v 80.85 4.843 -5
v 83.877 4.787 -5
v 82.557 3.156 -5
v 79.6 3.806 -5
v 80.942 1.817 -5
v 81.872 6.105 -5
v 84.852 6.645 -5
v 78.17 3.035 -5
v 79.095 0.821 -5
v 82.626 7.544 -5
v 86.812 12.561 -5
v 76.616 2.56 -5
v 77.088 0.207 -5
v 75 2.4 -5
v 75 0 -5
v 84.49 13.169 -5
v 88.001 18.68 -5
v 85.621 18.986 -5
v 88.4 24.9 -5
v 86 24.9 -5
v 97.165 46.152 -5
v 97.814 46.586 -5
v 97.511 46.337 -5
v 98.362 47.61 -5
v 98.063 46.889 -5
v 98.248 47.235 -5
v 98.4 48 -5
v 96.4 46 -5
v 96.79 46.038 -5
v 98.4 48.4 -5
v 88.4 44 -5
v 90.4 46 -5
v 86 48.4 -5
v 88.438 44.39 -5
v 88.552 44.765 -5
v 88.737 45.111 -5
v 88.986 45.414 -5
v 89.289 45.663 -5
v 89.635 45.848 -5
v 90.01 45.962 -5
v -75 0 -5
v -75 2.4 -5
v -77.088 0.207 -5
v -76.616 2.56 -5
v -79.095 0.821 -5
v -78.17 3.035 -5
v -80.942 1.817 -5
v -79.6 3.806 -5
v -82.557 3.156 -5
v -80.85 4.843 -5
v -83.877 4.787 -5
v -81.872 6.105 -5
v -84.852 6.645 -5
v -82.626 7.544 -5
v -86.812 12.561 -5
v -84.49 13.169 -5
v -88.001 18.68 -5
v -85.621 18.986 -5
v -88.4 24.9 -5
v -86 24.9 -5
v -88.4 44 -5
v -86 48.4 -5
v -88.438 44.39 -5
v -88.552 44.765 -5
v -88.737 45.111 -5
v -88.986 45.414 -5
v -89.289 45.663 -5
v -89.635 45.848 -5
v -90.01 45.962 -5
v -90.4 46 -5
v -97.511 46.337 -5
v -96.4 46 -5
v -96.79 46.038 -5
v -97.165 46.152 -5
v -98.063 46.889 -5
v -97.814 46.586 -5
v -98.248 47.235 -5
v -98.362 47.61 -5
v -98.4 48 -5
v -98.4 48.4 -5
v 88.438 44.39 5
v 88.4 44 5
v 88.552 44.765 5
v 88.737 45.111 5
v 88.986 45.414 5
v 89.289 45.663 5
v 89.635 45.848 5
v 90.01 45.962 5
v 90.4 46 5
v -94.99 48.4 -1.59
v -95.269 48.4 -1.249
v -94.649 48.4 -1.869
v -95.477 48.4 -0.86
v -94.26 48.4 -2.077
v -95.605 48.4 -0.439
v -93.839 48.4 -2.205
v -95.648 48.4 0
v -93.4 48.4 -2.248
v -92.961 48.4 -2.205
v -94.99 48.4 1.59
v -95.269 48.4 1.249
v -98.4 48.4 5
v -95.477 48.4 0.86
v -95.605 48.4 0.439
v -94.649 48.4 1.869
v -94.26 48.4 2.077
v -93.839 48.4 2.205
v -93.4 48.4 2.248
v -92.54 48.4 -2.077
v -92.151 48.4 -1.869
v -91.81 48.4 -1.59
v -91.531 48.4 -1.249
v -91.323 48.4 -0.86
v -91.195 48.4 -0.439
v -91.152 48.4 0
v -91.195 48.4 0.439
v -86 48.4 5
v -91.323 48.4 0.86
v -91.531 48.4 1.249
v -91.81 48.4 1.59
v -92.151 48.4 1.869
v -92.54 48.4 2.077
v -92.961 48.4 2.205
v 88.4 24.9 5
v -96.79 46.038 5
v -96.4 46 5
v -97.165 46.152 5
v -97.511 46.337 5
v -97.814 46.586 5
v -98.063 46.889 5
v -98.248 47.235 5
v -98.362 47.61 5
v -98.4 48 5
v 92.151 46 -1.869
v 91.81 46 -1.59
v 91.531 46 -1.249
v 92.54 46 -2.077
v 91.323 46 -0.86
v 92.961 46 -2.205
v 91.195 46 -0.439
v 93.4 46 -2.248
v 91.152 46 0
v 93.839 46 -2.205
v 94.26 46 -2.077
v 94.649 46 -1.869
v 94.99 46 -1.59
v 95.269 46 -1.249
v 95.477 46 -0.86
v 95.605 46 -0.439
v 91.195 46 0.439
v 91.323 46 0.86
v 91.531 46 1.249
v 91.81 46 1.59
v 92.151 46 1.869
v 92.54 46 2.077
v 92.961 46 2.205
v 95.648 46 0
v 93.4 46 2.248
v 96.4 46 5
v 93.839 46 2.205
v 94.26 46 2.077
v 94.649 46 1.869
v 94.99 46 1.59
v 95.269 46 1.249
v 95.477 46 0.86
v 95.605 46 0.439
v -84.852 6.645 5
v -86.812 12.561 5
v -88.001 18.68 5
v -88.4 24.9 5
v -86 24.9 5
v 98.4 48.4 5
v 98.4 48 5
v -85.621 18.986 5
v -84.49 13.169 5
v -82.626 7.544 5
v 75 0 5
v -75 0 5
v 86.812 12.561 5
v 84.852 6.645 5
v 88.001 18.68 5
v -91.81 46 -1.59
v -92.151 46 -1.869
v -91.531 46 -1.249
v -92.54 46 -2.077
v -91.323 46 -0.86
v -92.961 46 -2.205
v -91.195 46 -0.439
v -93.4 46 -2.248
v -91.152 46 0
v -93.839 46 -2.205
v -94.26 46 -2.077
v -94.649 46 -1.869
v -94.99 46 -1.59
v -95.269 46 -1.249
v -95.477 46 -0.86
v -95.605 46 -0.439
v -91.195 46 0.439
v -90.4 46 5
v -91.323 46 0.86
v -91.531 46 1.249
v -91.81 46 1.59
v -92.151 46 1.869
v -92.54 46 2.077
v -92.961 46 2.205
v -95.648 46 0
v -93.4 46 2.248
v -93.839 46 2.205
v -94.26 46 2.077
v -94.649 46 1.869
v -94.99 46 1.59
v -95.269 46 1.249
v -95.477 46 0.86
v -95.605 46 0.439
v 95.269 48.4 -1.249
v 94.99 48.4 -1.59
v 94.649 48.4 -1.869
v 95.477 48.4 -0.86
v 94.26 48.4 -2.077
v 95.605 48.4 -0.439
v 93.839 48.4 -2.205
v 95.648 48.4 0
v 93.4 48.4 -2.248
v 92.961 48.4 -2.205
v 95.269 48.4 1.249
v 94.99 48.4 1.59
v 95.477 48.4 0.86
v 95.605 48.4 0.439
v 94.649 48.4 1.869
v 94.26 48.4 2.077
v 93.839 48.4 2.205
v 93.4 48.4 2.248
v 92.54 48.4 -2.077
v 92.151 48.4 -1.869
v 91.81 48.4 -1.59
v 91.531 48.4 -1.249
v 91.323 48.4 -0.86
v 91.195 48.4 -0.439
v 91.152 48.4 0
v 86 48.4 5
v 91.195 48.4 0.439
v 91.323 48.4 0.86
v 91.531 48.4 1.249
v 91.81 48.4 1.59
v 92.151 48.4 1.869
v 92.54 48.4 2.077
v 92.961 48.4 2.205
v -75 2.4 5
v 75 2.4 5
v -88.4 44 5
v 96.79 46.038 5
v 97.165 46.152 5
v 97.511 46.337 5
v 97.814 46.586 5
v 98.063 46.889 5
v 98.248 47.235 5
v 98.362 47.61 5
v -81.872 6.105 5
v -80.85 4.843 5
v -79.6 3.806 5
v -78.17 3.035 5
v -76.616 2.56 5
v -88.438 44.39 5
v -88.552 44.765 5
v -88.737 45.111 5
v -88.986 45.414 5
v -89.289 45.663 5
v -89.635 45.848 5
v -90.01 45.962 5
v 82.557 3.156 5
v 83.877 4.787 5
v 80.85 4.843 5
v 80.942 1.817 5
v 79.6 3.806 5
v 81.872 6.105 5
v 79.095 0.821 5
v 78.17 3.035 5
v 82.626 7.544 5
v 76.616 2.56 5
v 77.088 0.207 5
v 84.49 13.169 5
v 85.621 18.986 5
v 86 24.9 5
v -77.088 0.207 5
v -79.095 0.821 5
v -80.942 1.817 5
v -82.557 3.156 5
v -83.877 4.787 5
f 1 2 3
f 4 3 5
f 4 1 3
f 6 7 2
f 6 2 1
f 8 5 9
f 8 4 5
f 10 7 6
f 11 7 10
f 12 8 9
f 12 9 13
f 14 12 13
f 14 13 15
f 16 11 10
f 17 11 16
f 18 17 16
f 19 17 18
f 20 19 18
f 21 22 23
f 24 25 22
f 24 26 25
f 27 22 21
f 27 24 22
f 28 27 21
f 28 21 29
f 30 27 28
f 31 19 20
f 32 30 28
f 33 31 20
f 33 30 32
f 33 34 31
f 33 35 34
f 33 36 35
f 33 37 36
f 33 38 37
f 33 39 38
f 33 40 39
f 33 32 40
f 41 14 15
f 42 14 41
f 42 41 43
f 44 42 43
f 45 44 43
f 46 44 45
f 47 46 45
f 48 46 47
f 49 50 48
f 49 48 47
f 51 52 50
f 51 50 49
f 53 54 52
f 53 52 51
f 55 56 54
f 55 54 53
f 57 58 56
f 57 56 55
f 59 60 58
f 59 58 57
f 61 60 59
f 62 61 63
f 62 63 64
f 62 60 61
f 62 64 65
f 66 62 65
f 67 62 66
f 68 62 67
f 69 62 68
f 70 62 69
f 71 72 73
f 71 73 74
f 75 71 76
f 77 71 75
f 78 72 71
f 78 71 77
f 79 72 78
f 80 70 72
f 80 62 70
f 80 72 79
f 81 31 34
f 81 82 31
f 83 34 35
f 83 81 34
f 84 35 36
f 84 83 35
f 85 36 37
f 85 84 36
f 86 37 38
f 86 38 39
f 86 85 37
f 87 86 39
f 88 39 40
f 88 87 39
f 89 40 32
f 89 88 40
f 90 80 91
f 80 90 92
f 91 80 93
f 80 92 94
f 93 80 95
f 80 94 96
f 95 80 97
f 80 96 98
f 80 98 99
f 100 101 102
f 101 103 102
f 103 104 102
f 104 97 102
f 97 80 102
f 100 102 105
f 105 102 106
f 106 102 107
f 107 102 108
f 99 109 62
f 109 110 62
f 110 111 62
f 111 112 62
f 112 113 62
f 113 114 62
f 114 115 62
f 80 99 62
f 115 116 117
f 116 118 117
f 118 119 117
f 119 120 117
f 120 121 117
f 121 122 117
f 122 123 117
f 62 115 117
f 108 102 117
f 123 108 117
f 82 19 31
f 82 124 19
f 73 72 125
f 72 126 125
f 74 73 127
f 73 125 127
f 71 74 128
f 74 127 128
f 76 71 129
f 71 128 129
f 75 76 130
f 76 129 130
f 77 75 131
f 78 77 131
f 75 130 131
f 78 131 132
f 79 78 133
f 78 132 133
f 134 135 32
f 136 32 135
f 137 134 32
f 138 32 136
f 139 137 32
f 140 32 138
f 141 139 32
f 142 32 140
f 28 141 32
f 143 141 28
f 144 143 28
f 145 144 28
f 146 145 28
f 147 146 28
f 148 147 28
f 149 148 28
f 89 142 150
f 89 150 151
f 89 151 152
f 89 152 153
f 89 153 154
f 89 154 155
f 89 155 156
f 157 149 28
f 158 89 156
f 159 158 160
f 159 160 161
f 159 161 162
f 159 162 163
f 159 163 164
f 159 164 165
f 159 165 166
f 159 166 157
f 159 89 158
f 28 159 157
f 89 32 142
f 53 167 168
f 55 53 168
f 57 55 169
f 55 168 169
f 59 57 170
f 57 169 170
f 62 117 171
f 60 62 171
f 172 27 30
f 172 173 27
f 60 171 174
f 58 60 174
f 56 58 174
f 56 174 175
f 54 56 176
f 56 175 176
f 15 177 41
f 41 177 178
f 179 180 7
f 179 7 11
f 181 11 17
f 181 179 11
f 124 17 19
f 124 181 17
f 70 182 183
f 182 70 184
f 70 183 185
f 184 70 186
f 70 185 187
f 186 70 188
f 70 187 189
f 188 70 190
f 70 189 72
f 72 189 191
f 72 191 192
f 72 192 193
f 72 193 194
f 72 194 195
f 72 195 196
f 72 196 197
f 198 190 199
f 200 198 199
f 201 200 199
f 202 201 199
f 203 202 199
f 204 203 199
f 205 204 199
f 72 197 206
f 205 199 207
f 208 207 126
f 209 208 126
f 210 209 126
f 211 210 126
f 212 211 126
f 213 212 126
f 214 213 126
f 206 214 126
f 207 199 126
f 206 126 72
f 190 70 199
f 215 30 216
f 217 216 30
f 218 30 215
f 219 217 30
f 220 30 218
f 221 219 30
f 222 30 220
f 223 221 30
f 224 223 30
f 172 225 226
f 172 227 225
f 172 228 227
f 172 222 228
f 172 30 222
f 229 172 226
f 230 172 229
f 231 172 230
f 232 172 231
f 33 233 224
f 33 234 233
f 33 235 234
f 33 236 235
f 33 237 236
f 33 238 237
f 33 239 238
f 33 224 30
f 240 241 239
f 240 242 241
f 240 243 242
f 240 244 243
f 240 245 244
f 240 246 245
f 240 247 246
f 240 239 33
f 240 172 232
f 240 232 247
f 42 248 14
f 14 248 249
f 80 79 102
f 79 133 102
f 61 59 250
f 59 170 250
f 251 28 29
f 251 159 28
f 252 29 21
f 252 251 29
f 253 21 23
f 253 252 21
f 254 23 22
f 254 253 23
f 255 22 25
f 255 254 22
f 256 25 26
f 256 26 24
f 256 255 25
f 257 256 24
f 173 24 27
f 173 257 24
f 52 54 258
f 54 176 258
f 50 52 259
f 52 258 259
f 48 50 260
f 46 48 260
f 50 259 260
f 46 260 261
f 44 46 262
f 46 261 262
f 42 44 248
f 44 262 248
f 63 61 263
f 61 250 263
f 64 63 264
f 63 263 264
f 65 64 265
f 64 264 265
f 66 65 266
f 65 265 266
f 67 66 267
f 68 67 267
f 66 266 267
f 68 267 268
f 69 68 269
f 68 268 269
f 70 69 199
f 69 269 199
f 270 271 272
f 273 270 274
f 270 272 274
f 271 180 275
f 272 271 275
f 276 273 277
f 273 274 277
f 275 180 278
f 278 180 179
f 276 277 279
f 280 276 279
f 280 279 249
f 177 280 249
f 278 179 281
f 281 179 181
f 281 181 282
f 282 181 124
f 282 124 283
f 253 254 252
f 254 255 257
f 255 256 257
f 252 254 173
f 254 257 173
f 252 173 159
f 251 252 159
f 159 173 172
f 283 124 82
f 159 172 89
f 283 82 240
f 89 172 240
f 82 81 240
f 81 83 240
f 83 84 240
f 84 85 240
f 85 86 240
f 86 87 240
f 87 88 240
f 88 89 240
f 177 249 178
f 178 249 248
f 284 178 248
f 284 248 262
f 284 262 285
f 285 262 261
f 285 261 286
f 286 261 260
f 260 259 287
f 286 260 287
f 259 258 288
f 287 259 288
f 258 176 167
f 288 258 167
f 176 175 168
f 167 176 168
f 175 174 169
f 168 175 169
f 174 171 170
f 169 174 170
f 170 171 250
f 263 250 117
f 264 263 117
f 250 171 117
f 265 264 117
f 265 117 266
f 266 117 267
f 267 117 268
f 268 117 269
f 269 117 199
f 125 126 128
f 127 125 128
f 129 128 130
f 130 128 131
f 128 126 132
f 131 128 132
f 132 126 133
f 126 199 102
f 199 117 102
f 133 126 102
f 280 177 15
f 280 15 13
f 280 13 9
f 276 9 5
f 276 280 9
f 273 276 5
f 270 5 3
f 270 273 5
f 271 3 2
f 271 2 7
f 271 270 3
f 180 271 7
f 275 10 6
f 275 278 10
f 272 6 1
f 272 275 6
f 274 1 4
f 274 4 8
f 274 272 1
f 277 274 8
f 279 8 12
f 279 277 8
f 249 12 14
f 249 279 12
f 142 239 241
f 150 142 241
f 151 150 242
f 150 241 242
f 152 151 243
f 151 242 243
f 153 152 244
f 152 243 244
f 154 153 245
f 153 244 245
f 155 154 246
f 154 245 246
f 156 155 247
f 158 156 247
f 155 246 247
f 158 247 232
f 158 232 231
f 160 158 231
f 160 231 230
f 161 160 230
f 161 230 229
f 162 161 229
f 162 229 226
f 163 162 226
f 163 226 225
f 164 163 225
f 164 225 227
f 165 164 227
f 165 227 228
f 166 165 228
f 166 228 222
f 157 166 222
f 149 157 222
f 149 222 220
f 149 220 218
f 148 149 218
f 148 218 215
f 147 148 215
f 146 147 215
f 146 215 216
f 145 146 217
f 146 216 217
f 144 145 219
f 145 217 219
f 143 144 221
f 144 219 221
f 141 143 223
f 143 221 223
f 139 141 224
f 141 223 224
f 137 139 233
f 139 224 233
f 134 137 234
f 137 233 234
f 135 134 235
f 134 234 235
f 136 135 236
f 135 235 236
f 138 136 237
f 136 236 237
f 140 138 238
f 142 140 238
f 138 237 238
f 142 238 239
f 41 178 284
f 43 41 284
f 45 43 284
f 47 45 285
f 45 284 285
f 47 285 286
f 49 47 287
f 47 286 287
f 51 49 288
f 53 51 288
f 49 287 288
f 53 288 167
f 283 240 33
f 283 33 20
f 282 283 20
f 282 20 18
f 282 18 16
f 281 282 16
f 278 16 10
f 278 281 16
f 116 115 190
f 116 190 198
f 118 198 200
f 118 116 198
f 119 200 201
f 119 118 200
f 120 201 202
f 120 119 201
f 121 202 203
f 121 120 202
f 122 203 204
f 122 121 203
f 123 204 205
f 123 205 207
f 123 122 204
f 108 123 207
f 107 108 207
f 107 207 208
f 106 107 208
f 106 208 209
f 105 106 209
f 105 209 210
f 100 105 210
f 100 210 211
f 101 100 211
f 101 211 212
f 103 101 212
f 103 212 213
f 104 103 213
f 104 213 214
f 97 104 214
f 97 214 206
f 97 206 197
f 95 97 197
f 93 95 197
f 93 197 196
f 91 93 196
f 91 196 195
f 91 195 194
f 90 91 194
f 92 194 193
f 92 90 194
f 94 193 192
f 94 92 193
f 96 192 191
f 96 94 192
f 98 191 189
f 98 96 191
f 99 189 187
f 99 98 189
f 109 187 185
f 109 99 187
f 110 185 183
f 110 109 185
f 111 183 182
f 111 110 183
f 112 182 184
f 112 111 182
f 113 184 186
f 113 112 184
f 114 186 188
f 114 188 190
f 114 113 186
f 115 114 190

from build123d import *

# Parameters (mm, degrees)
F1_DEPTH = 5
F3_D     = 4.4958
F4_R     = 2


with BuildPart() as f1:
    # F0 (on Top) → F1 (new body, symmetric)
    with BuildSketch(Plane.XY):
        with BuildLine():
            Line((0, 2.4), (0, 0))
            Line((0, 0), (75, 0))
            ThreePointArc((75, 0), (80.9415780593, 1.816522709), (84.8515829028, 6.6449765723))
            ThreePointArc((84.8515829028, 6.6449765723), (87.5046708667, 15.6016514337), (88.4, 24.9))
            Line((88.4, 24.9), (88.4, 46))
            Line((88.4, 46), (98.4, 46))
            Line((98.4, 46), (98.4, 48.4))
            Line((98.4, 48.4), (86, 48.4))
            Line((86, 48.4), (86, 24.9))
            ThreePointArc((86, 24.9), (85.1487656265, 16.0595930226), (82.6263416519, 7.5440323965))
            ThreePointArc((82.6263416519, 7.5440323965), (79.5995150909, 3.8062128831), (75, 2.4))
            Line((75, 2.4), (0, 2.4))
        make_face()
    extrude(amount=F1_DEPTH, both=True)

    # F3 (through all)
    with Locations(Plane.XZ.offset(-46)):
        with Locations((93.4, 0)):
            Hole(F3_D / 2)

    # F4
    f4_edges = [f1.edges().sort_by_distance(p)[0] for p in [
        (88.4, 46, 0),
        (98.4, 46, 0),
    ]]
    fillet(f4_edges, radius=F4_R)

    # F5: F1 across face


with BuildPart() as f1_1:
    add(f1.part)
    add(f1.part.mirror(Plane(origin=(0, 1.2, 0), x_dir=(0, -1, 0), z_dir=(-1, 0, 0))))


solid = f1_1.part
